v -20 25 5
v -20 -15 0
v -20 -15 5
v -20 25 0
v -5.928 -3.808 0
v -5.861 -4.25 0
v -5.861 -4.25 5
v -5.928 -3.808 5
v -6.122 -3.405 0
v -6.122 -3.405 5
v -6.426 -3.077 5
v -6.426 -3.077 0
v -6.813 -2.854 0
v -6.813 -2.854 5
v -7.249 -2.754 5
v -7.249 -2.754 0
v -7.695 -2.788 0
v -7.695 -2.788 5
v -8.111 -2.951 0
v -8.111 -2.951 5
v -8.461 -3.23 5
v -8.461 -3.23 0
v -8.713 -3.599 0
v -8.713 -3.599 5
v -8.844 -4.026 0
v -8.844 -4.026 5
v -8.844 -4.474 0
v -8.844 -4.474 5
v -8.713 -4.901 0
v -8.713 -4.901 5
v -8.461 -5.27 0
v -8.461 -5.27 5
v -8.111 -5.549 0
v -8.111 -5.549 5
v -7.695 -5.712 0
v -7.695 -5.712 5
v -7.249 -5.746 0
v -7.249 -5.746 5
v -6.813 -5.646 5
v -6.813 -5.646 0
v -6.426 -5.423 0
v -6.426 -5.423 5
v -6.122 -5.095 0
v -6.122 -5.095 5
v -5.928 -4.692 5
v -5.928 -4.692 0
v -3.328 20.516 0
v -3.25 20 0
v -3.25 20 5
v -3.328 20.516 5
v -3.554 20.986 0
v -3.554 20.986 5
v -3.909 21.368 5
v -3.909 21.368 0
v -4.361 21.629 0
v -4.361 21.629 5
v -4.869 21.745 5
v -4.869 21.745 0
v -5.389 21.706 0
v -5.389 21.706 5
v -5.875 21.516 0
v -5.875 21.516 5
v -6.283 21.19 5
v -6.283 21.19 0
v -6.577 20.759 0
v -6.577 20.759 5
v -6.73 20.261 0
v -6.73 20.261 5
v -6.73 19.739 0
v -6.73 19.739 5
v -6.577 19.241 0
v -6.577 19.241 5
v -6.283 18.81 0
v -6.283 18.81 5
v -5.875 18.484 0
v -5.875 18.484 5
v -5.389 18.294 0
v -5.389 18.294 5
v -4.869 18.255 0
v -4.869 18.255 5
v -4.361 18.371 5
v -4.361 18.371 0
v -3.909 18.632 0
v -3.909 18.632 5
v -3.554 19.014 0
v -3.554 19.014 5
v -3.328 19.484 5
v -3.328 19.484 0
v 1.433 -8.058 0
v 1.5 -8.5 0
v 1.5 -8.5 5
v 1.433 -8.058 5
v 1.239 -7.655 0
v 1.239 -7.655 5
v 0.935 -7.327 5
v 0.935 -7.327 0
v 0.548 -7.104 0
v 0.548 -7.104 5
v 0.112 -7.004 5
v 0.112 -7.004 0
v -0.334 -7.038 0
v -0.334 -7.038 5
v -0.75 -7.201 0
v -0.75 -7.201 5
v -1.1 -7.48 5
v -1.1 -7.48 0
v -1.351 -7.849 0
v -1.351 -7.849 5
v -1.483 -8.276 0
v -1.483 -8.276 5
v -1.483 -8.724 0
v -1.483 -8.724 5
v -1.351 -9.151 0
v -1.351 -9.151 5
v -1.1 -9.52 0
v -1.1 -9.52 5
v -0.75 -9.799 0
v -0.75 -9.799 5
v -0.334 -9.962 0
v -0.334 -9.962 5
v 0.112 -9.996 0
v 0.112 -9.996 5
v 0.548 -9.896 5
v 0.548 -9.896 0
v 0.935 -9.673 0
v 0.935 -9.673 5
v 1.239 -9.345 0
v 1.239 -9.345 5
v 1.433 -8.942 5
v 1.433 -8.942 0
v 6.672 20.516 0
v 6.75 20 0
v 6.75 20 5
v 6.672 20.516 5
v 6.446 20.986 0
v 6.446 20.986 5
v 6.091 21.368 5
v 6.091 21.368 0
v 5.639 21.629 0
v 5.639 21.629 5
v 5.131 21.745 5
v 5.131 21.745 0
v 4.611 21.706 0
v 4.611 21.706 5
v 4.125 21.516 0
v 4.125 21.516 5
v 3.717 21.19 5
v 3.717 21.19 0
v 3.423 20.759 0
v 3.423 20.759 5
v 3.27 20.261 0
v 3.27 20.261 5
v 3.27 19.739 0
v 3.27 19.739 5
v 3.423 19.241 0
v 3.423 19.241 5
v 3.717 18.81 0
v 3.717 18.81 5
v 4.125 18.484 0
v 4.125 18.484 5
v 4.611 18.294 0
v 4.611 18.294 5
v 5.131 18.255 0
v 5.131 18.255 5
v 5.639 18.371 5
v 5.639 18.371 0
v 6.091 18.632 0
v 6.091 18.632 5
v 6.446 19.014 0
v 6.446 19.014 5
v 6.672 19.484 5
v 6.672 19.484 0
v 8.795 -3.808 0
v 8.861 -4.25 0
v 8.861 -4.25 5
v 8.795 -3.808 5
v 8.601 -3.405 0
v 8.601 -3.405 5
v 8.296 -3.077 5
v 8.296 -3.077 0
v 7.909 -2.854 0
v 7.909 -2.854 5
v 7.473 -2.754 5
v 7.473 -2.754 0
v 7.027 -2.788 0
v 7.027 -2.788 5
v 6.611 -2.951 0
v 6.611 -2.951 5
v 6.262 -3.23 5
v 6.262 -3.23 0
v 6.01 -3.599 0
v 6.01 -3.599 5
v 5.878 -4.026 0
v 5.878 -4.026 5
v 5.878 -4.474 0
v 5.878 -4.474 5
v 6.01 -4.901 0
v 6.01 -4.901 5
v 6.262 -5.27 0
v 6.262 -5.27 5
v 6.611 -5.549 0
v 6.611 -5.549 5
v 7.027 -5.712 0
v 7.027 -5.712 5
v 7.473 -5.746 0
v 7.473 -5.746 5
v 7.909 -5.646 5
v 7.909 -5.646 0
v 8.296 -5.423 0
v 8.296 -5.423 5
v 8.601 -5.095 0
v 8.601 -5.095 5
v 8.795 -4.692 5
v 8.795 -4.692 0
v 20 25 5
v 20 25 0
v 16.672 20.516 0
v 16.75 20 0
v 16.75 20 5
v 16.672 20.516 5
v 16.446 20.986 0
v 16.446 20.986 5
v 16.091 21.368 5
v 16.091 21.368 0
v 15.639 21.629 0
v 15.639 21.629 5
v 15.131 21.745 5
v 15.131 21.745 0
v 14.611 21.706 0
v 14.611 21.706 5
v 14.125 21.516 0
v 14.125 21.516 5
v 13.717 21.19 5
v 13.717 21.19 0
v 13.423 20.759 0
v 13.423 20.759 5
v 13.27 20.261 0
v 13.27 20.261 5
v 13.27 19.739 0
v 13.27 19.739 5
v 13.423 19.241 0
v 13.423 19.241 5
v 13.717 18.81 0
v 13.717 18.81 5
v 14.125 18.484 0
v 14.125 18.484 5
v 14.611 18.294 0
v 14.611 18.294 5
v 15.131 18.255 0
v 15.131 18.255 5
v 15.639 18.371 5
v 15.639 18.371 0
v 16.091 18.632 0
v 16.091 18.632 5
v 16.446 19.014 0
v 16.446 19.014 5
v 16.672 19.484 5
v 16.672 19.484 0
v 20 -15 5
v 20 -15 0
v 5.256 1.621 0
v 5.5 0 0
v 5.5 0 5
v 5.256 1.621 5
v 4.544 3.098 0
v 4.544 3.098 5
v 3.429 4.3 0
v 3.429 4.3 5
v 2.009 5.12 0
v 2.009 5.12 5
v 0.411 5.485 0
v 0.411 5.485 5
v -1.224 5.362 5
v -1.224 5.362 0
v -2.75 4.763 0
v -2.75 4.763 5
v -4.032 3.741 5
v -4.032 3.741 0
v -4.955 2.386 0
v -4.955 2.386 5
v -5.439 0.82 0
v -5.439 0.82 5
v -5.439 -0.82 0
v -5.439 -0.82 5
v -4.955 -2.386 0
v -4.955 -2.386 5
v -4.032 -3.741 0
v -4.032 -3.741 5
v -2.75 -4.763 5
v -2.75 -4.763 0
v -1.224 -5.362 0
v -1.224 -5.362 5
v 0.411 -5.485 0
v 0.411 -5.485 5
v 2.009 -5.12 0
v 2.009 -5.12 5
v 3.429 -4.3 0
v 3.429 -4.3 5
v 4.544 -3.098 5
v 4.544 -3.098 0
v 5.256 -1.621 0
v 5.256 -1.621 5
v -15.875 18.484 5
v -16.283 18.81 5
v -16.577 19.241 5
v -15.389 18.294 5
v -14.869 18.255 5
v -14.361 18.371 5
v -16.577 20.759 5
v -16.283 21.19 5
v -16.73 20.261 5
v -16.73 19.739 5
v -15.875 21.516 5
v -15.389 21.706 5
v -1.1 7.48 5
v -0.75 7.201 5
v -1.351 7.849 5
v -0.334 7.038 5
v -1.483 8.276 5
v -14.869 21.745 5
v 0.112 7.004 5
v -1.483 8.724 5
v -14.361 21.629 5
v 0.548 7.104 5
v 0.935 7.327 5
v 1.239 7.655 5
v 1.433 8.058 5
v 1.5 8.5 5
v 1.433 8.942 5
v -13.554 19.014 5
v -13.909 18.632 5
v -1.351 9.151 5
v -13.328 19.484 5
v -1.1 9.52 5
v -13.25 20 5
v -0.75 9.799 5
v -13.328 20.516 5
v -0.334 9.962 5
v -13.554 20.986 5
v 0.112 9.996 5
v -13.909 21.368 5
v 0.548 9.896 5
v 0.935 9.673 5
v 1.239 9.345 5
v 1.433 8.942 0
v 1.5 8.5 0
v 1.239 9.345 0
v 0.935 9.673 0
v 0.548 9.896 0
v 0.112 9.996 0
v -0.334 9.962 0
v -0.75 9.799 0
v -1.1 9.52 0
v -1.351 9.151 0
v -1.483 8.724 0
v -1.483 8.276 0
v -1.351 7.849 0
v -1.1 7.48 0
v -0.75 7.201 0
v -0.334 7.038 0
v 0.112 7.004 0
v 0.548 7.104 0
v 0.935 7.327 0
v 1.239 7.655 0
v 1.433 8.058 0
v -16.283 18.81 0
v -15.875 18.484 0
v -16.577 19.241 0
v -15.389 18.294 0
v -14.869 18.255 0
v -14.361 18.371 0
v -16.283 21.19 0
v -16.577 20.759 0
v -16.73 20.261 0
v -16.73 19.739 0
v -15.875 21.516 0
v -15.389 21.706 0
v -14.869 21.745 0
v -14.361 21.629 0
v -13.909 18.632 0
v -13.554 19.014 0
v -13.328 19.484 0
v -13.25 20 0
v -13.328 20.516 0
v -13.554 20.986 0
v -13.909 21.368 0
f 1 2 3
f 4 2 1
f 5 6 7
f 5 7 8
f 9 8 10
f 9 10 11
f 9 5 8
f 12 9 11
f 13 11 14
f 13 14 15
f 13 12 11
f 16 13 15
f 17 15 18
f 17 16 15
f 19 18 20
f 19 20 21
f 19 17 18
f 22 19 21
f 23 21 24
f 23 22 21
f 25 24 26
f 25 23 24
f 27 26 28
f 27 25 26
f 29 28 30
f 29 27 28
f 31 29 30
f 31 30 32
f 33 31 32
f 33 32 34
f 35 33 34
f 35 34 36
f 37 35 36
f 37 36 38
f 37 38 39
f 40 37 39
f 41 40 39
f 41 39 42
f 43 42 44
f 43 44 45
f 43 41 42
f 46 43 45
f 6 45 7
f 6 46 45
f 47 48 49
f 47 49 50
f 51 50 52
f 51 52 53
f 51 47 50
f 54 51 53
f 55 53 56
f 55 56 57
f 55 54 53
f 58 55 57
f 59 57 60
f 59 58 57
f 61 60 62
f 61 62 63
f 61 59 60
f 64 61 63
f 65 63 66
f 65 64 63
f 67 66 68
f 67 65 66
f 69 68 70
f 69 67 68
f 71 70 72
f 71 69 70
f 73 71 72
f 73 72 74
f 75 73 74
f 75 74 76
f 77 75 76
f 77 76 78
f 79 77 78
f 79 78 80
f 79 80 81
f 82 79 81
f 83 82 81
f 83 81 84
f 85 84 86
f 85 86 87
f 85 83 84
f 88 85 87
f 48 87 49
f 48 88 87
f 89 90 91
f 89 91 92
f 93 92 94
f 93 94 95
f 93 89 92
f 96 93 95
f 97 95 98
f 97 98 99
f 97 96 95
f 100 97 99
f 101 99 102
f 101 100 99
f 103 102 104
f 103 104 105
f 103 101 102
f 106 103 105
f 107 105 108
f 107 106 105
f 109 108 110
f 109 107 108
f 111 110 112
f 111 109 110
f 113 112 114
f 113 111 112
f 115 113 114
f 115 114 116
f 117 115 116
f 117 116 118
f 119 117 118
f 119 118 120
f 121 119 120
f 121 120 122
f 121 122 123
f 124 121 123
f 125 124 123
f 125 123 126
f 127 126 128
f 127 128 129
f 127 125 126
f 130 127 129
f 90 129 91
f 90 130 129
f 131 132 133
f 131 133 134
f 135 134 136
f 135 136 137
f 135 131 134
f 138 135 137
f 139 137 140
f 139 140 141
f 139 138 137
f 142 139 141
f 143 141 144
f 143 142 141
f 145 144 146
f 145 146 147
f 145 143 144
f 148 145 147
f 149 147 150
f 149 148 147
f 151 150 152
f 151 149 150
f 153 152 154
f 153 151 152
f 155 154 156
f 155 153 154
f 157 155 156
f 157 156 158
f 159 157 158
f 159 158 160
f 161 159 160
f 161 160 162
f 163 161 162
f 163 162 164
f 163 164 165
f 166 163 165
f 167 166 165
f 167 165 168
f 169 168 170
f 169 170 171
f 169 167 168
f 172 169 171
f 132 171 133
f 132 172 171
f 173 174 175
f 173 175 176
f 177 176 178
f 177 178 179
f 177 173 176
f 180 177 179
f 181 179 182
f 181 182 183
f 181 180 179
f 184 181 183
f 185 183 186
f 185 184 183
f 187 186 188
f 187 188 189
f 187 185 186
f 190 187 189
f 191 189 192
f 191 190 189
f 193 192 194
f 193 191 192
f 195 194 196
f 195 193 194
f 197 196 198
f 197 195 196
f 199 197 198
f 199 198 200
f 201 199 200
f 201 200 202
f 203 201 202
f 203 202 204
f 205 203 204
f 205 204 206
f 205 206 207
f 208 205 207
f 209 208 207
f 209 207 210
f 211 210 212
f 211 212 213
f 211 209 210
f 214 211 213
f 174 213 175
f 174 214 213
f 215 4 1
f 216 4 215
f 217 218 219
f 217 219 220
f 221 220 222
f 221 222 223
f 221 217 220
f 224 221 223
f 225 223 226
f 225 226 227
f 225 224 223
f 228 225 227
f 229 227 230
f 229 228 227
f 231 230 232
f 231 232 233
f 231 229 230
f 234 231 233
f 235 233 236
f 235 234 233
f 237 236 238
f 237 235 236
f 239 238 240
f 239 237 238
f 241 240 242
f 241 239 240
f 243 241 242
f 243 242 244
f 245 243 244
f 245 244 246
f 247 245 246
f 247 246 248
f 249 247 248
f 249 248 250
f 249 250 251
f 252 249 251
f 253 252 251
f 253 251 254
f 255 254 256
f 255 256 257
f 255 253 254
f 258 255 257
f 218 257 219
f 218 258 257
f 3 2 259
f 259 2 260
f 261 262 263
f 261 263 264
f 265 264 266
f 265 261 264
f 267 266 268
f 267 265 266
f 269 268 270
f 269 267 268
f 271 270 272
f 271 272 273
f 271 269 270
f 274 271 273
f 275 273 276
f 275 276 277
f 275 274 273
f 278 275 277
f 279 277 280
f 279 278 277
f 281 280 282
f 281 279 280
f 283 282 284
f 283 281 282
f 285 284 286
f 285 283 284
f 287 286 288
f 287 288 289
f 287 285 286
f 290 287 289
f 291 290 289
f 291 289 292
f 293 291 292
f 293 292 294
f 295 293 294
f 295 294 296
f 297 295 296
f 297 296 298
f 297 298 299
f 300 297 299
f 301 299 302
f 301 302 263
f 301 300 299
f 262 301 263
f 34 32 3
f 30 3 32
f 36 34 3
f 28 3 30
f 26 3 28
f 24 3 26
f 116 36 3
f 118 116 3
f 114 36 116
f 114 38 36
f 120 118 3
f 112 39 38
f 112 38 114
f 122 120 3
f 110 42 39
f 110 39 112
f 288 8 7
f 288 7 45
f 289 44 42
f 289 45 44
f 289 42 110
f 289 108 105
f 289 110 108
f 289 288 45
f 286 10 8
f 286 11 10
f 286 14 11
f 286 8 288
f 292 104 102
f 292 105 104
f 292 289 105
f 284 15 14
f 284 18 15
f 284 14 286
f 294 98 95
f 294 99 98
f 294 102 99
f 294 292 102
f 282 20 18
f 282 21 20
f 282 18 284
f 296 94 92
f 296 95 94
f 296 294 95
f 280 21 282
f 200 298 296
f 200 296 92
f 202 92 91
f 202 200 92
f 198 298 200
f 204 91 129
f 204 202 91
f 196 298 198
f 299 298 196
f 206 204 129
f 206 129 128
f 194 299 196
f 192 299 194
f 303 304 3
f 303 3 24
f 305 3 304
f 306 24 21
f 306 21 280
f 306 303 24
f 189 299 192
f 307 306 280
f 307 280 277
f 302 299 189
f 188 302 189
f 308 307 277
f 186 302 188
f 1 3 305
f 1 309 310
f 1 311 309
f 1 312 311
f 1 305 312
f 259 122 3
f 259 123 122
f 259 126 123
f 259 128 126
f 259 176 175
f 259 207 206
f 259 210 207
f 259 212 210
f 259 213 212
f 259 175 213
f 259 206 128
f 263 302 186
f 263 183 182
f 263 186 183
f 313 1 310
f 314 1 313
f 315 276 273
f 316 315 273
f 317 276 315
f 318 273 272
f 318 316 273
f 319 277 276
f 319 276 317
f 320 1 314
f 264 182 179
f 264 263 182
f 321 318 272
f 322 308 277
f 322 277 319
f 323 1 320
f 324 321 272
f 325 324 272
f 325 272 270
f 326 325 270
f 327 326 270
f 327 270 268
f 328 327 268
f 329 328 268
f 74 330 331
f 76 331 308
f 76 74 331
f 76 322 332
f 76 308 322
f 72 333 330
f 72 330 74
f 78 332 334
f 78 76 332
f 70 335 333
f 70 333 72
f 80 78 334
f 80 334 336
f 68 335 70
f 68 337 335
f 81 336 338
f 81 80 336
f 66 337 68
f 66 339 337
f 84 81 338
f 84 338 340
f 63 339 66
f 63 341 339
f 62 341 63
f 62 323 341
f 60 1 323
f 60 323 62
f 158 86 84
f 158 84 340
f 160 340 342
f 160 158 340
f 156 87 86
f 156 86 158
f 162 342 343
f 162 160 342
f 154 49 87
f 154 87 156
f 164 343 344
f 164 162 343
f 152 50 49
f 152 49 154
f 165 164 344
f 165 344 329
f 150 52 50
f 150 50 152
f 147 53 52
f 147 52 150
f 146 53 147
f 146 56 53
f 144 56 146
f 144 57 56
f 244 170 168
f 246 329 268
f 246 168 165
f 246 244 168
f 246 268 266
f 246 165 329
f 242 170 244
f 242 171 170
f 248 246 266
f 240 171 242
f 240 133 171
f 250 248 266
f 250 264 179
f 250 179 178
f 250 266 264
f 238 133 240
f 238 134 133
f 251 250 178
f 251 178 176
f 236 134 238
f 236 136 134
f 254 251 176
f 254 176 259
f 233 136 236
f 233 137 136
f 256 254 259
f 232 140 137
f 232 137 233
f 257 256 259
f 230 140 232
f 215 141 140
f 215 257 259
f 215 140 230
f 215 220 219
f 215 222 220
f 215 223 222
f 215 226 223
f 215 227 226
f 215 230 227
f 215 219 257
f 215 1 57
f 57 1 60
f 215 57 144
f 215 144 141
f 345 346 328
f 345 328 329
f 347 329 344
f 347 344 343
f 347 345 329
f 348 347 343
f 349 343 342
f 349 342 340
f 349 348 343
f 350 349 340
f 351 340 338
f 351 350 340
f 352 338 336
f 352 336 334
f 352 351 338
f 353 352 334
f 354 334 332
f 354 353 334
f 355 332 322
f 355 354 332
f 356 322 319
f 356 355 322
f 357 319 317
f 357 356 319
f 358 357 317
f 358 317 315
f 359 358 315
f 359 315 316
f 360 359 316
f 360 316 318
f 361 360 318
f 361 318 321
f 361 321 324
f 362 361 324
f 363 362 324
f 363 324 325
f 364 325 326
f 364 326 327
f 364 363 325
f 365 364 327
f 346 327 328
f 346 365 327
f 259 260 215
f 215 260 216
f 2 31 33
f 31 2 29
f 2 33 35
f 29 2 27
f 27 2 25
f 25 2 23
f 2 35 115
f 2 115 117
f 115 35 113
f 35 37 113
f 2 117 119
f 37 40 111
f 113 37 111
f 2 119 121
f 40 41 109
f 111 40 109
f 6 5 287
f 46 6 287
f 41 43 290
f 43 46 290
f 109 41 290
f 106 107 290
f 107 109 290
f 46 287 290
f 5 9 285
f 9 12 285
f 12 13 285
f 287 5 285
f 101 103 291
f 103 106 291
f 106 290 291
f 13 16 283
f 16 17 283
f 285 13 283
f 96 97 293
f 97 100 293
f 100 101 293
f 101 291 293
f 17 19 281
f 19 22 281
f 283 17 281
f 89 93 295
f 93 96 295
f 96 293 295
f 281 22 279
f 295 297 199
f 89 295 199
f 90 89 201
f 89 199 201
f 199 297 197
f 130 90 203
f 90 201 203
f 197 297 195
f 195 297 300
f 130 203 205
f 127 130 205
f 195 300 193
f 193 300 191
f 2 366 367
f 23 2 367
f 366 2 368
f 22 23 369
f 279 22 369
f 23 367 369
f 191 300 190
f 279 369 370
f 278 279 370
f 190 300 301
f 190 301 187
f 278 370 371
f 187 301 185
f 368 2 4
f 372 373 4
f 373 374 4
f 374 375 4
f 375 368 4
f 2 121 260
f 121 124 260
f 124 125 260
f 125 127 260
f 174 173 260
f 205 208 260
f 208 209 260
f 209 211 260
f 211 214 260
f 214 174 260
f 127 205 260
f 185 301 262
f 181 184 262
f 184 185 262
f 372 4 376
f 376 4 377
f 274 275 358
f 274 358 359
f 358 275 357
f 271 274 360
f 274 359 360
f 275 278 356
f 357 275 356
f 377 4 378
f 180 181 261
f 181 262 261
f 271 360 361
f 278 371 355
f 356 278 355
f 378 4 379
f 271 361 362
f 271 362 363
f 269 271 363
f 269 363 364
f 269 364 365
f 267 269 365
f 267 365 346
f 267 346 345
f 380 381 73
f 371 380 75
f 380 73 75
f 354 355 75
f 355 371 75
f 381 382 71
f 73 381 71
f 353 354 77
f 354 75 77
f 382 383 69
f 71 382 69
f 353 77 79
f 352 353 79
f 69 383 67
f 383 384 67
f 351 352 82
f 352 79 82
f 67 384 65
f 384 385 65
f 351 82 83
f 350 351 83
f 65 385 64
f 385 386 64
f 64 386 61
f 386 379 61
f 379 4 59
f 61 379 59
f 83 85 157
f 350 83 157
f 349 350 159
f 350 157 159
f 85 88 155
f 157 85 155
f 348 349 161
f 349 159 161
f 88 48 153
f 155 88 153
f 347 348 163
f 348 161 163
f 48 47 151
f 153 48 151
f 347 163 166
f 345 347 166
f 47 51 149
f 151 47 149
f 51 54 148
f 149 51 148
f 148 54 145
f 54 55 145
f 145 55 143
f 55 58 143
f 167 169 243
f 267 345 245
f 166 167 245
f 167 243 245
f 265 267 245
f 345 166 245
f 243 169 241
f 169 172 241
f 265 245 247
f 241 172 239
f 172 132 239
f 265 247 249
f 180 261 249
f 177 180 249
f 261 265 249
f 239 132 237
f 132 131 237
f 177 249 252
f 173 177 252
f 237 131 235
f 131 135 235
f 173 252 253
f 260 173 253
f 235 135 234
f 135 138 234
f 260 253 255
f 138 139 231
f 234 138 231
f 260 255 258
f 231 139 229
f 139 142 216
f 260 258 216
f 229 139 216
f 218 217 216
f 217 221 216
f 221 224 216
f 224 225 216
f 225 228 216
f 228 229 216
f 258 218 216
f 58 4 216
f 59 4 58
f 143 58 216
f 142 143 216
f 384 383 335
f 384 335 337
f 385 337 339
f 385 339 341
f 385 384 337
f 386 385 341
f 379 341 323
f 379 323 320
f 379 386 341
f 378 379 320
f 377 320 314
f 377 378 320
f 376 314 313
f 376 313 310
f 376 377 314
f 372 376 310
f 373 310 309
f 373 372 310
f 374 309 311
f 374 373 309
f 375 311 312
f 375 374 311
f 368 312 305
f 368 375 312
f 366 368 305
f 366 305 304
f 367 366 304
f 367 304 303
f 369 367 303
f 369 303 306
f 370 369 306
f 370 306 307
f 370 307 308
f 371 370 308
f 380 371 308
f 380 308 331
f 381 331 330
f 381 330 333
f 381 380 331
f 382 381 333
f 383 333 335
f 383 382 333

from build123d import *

# Parameters (mm, degrees)
SKETCH1_W           = 40
SKETCH1_H           = 40
SKETCH1_R           = 5.5
SKETCH1_R_2         = 1.5
SKETCH1_R_3         = 1.75
BOSS_EXTRUDE1_DEPTH = 5


with BuildPart() as part:
    # Sketch1 → Boss-Extrude1 (new body)
    with BuildSketch(Plane.XY):
        with Locations((0, 5)):
            Rectangle(SKETCH1_W, SKETCH1_H)
        Circle(SKETCH1_R, mode=Mode.SUBTRACT)
        with Locations((0, -8.5)):
            Circle(SKETCH1_R_2, mode=Mode.SUBTRACT)
        with Locations((0, 8.5)):
            Circle(SKETCH1_R_2, mode=Mode.SUBTRACT)
        with Locations((7.361215932, -4.25)):
            Circle(SKETCH1_R_2, mode=Mode.SUBTRACT)
        with Locations((-7.361215932, -4.25)):
            Circle(SKETCH1_R_2, mode=Mode.SUBTRACT)
        with Locations((-15, 20)):
            Circle(SKETCH1_R_3, mode=Mode.SUBTRACT)
        with Locations((-5, 20)):
            Circle(SKETCH1_R_3, mode=Mode.SUBTRACT)
        with Locations((5, 20)):
            Circle(SKETCH1_R_3, mode=Mode.SUBTRACT)
        with Locations((15, 20)):
            Circle(SKETCH1_R_3, mode=Mode.SUBTRACT)
    extrude(amount=BOSS_EXTRUDE1_DEPTH)


solid = part.part
